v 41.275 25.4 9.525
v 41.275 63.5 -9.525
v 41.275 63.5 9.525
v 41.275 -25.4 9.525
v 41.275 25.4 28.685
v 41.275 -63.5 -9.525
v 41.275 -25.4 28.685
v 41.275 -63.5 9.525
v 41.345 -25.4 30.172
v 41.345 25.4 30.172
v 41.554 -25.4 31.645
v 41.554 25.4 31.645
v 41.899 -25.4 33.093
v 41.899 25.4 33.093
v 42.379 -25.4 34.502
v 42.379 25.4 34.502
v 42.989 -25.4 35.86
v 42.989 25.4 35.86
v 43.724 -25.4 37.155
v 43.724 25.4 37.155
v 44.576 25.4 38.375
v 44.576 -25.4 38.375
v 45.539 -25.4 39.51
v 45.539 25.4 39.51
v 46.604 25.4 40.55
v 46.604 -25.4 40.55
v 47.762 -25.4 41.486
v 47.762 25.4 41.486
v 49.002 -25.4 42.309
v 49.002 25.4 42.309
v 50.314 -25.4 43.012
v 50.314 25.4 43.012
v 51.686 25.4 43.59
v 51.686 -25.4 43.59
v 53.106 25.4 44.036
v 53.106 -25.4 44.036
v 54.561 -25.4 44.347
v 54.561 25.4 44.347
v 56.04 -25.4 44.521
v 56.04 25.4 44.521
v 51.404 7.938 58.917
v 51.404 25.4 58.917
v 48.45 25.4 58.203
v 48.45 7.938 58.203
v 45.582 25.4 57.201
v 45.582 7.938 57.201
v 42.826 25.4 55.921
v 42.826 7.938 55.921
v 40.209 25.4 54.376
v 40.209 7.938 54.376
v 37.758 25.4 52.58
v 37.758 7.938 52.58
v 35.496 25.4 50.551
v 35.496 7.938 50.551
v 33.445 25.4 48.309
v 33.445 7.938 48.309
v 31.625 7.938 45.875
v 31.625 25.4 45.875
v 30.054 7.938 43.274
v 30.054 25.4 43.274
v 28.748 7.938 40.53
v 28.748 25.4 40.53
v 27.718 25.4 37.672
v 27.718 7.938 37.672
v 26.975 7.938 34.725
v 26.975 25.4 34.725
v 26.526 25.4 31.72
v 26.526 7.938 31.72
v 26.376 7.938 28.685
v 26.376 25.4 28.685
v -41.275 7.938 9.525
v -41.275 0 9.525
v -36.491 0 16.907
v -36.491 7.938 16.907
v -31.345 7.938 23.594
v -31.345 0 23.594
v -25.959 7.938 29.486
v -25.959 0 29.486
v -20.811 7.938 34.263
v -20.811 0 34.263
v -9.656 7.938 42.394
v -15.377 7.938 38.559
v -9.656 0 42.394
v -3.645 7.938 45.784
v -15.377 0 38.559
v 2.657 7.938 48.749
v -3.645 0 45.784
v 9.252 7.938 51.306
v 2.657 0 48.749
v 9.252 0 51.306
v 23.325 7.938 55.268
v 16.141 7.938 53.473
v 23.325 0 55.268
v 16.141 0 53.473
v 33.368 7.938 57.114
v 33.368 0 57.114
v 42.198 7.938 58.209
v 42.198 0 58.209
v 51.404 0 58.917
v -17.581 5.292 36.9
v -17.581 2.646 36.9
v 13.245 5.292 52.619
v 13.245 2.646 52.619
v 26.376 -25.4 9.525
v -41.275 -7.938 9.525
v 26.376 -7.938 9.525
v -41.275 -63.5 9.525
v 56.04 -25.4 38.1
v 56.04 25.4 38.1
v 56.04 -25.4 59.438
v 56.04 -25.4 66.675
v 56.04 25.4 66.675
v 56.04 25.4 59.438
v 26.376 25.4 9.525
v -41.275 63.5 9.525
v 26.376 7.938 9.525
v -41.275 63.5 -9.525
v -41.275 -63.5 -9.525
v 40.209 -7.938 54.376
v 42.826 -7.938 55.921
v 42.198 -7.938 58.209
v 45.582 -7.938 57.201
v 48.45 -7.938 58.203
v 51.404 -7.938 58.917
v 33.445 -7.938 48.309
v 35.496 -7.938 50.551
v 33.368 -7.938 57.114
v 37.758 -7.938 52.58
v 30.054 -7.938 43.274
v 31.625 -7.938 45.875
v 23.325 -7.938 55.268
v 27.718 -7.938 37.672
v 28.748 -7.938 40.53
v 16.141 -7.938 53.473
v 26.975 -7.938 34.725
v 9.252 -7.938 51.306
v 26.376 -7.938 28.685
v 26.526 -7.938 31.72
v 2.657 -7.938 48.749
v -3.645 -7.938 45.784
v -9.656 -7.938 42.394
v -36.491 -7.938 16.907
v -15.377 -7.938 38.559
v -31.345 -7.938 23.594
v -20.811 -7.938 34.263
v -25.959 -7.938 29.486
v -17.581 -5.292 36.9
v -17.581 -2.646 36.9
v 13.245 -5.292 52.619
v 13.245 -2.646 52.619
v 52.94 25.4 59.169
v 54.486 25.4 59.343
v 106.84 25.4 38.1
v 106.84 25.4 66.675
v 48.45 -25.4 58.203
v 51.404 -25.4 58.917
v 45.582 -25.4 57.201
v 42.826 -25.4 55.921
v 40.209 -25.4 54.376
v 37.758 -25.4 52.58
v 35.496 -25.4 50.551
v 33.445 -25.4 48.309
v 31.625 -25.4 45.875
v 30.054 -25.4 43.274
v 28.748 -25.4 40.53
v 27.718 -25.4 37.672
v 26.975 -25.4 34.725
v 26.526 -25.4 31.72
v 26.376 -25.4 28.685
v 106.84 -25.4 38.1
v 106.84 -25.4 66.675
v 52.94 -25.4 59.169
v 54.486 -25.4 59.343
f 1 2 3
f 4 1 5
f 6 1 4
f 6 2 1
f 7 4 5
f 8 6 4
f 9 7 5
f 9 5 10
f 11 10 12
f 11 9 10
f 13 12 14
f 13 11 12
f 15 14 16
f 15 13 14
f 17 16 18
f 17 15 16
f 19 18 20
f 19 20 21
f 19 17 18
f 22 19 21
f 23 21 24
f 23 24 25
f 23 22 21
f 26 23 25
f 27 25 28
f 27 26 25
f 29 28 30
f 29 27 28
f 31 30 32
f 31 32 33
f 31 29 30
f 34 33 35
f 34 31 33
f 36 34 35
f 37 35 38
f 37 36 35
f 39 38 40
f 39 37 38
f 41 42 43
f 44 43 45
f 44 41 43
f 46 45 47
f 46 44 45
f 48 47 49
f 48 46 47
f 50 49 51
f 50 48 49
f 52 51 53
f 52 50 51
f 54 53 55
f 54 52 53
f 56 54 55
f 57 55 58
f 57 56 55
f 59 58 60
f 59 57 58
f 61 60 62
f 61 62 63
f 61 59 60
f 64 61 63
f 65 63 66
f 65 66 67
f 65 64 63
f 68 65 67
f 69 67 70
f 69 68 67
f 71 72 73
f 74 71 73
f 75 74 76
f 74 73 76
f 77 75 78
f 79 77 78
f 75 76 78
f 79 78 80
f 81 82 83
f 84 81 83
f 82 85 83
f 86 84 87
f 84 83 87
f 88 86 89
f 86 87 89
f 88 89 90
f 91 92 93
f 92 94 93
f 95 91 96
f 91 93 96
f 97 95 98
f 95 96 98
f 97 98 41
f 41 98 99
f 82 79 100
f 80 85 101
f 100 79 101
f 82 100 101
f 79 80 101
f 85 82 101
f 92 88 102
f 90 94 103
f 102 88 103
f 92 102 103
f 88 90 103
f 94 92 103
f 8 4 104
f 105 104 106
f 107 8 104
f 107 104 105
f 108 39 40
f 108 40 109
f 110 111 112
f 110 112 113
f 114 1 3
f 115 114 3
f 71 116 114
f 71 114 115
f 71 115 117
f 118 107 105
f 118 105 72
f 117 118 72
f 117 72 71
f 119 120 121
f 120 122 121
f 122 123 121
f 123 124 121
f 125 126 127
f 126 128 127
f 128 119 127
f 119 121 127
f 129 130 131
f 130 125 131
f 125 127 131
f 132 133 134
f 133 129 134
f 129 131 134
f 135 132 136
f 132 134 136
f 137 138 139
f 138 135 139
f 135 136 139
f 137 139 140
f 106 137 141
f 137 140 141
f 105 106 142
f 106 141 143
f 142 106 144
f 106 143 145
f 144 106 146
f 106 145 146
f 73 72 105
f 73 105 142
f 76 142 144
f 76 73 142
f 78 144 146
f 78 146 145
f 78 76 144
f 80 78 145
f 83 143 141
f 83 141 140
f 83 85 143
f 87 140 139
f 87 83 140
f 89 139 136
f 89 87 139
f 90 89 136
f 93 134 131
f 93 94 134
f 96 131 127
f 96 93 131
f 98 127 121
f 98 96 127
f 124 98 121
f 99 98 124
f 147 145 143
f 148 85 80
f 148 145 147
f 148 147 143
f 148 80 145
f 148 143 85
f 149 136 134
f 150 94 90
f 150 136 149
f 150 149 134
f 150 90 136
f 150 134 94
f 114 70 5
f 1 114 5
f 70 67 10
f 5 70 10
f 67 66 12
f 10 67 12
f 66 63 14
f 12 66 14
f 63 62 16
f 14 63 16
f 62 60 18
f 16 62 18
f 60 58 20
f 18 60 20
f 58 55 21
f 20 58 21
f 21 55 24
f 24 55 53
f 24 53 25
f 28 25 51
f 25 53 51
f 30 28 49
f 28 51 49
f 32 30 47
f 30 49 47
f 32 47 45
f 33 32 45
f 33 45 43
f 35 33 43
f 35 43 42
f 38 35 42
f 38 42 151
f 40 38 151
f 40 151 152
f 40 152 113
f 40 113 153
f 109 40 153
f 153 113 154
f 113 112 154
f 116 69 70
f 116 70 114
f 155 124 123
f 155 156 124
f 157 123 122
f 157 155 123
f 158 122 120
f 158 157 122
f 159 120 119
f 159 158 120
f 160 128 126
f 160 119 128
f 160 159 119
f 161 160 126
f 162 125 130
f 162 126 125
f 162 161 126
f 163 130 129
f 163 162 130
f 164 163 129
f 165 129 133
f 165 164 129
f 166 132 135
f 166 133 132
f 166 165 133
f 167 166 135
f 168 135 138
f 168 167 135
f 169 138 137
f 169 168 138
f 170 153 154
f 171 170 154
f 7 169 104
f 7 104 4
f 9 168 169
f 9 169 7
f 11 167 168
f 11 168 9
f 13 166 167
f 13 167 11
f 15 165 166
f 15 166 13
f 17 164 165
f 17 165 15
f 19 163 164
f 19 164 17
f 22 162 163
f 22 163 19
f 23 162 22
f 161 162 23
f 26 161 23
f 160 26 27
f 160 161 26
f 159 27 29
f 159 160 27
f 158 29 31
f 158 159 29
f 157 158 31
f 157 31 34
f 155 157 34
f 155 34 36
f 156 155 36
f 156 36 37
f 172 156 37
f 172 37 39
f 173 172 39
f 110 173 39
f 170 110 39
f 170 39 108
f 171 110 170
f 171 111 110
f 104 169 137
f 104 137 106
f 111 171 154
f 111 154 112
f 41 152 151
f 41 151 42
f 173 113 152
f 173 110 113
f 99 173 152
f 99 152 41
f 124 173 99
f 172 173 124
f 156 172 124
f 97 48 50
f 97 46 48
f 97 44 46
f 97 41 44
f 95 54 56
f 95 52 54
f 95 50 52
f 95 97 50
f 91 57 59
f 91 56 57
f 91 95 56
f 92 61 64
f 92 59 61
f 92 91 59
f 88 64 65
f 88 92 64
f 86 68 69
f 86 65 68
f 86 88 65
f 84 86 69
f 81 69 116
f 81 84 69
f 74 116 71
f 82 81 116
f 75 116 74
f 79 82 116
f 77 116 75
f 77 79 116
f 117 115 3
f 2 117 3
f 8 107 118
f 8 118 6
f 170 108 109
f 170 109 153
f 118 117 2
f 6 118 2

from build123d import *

# Parameters (mm, degrees)
F1_DEPTH = 63.5
F2_DEPTH = 25.4
F3_DEPTH = 7.9375


with BuildPart() as f1:
    # F0 (on Front) → F1 (new body, symmetric)
    with BuildSketch(Plane.XZ):
        Polygon((26.376324, 9.525), (-41.275, 9.525), (-41.275, -9.525), (41.275, -9.525), (41.275, 9.525), align=None)
    extrude(amount=F1_DEPTH, both=True)

    # F0 (on Front) → F2 (join, symmetric)
    with BuildSketch(Plane.XZ):
        with BuildLine():
            Line((26.376324, 28.684646), (26.376324, 9.525))
            Line((26.376324, 9.525), (41.275, 9.525))
            Line((41.275, 9.525), (41.275, 28.684646))
            ThreePointArc((41.275, 28.684646), (45.538798, 39.510339), (56.039803, 44.520778))
            Line((56.039803, 44.520778), (56.039803, 59.43829))
            ThreePointArc((56.039803, 59.43829), (53.712029, 59.265678), (51.404034, 58.917129))
            ThreePointArc((51.404034, 58.917129), (33.44511, 48.308543), (26.376324, 28.684646))
        make_face()
        Polygon((56.039803, 66.675), (56.039803, 59.43829), (56.039803, 44.520778), (56.039803, 38.144724), (56.039803, 38.1), (106.839803, 38.1), (106.839803, 66.675), align=None)
    extrude(amount=F2_DEPTH, both=True)

    # F0 (on Front) → F3 (join, symmetric)
    with BuildSketch(Plane.XZ):
        with BuildLine():
            add(Edge.make_bspline(
                [(-41.275, 9.525), (-21.080984, 43.4733), (9.512173, 56.584653), (51.404034, 58.917129)],
                knots=[0, 0, 0, 0, 105.018978, 105.018978, 105.018978, 105.018978], degree=3))
            Line((-41.275, 9.525), (26.376324, 9.525))
            Line((26.376324, 9.525), (26.376324, 28.684646))
            ThreePointArc((26.376324, 28.684646), (33.44511, 48.308543), (51.404034, 58.917129))
        make_face()
    extrude(amount=F3_DEPTH, both=True)


solid = f1.part
